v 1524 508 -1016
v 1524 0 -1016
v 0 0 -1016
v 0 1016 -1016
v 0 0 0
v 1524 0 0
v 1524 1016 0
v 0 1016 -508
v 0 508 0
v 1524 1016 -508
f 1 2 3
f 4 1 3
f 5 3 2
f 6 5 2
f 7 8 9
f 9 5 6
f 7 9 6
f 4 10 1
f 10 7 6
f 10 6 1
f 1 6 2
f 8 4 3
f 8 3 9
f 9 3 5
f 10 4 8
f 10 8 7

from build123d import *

# Parameters (mm, degrees)
BOSS_EXTRUDE1_DEPTH = 1016


with BuildPart() as part:
    # Sketch1 → Boss-Extrude1 (new body)
    with BuildSketch(Plane(origin=(0, 0, 0), x_dir=(1, 0, 0), z_dir=(0, 1, 0))):
        Polygon((0, 1016), (0, 508), (1524, 0), (1524, 508), align=None)
        Polygon((1524, 1016), (0, 1016), (1524, 508), align=None)
        Polygon((0, 508), (0, 0), (1524, 0), align=None)
    extrude(amount=BOSS_EXTRUDE1_DEPTH)

    # SurfaceCut1
    split(bisect_by=Plane(origin=(320.842105263, 962.526315789, -962.526315789), x_dir=(-0.9733285267845753, 0.16222142113076252, -0.1622214211307626), z_dir=(0.22941573387056174, 0.6882472016116851, -0.6882472016116855)), keep=Keep.BOTTOM)

    # SurfaceCut2
    split(bisect_by=Plane(origin=(-80.210526316, 240.631578947, 240.631578947), x_dir=(0.9733285267845753, 0.16222142113076254, 0.16222142113076254), z_dir=(-0.22941573387056177, 0.6882472016116853, 0.6882472016116854)), keep=Keep.BOTTOM)


solid = part.part
